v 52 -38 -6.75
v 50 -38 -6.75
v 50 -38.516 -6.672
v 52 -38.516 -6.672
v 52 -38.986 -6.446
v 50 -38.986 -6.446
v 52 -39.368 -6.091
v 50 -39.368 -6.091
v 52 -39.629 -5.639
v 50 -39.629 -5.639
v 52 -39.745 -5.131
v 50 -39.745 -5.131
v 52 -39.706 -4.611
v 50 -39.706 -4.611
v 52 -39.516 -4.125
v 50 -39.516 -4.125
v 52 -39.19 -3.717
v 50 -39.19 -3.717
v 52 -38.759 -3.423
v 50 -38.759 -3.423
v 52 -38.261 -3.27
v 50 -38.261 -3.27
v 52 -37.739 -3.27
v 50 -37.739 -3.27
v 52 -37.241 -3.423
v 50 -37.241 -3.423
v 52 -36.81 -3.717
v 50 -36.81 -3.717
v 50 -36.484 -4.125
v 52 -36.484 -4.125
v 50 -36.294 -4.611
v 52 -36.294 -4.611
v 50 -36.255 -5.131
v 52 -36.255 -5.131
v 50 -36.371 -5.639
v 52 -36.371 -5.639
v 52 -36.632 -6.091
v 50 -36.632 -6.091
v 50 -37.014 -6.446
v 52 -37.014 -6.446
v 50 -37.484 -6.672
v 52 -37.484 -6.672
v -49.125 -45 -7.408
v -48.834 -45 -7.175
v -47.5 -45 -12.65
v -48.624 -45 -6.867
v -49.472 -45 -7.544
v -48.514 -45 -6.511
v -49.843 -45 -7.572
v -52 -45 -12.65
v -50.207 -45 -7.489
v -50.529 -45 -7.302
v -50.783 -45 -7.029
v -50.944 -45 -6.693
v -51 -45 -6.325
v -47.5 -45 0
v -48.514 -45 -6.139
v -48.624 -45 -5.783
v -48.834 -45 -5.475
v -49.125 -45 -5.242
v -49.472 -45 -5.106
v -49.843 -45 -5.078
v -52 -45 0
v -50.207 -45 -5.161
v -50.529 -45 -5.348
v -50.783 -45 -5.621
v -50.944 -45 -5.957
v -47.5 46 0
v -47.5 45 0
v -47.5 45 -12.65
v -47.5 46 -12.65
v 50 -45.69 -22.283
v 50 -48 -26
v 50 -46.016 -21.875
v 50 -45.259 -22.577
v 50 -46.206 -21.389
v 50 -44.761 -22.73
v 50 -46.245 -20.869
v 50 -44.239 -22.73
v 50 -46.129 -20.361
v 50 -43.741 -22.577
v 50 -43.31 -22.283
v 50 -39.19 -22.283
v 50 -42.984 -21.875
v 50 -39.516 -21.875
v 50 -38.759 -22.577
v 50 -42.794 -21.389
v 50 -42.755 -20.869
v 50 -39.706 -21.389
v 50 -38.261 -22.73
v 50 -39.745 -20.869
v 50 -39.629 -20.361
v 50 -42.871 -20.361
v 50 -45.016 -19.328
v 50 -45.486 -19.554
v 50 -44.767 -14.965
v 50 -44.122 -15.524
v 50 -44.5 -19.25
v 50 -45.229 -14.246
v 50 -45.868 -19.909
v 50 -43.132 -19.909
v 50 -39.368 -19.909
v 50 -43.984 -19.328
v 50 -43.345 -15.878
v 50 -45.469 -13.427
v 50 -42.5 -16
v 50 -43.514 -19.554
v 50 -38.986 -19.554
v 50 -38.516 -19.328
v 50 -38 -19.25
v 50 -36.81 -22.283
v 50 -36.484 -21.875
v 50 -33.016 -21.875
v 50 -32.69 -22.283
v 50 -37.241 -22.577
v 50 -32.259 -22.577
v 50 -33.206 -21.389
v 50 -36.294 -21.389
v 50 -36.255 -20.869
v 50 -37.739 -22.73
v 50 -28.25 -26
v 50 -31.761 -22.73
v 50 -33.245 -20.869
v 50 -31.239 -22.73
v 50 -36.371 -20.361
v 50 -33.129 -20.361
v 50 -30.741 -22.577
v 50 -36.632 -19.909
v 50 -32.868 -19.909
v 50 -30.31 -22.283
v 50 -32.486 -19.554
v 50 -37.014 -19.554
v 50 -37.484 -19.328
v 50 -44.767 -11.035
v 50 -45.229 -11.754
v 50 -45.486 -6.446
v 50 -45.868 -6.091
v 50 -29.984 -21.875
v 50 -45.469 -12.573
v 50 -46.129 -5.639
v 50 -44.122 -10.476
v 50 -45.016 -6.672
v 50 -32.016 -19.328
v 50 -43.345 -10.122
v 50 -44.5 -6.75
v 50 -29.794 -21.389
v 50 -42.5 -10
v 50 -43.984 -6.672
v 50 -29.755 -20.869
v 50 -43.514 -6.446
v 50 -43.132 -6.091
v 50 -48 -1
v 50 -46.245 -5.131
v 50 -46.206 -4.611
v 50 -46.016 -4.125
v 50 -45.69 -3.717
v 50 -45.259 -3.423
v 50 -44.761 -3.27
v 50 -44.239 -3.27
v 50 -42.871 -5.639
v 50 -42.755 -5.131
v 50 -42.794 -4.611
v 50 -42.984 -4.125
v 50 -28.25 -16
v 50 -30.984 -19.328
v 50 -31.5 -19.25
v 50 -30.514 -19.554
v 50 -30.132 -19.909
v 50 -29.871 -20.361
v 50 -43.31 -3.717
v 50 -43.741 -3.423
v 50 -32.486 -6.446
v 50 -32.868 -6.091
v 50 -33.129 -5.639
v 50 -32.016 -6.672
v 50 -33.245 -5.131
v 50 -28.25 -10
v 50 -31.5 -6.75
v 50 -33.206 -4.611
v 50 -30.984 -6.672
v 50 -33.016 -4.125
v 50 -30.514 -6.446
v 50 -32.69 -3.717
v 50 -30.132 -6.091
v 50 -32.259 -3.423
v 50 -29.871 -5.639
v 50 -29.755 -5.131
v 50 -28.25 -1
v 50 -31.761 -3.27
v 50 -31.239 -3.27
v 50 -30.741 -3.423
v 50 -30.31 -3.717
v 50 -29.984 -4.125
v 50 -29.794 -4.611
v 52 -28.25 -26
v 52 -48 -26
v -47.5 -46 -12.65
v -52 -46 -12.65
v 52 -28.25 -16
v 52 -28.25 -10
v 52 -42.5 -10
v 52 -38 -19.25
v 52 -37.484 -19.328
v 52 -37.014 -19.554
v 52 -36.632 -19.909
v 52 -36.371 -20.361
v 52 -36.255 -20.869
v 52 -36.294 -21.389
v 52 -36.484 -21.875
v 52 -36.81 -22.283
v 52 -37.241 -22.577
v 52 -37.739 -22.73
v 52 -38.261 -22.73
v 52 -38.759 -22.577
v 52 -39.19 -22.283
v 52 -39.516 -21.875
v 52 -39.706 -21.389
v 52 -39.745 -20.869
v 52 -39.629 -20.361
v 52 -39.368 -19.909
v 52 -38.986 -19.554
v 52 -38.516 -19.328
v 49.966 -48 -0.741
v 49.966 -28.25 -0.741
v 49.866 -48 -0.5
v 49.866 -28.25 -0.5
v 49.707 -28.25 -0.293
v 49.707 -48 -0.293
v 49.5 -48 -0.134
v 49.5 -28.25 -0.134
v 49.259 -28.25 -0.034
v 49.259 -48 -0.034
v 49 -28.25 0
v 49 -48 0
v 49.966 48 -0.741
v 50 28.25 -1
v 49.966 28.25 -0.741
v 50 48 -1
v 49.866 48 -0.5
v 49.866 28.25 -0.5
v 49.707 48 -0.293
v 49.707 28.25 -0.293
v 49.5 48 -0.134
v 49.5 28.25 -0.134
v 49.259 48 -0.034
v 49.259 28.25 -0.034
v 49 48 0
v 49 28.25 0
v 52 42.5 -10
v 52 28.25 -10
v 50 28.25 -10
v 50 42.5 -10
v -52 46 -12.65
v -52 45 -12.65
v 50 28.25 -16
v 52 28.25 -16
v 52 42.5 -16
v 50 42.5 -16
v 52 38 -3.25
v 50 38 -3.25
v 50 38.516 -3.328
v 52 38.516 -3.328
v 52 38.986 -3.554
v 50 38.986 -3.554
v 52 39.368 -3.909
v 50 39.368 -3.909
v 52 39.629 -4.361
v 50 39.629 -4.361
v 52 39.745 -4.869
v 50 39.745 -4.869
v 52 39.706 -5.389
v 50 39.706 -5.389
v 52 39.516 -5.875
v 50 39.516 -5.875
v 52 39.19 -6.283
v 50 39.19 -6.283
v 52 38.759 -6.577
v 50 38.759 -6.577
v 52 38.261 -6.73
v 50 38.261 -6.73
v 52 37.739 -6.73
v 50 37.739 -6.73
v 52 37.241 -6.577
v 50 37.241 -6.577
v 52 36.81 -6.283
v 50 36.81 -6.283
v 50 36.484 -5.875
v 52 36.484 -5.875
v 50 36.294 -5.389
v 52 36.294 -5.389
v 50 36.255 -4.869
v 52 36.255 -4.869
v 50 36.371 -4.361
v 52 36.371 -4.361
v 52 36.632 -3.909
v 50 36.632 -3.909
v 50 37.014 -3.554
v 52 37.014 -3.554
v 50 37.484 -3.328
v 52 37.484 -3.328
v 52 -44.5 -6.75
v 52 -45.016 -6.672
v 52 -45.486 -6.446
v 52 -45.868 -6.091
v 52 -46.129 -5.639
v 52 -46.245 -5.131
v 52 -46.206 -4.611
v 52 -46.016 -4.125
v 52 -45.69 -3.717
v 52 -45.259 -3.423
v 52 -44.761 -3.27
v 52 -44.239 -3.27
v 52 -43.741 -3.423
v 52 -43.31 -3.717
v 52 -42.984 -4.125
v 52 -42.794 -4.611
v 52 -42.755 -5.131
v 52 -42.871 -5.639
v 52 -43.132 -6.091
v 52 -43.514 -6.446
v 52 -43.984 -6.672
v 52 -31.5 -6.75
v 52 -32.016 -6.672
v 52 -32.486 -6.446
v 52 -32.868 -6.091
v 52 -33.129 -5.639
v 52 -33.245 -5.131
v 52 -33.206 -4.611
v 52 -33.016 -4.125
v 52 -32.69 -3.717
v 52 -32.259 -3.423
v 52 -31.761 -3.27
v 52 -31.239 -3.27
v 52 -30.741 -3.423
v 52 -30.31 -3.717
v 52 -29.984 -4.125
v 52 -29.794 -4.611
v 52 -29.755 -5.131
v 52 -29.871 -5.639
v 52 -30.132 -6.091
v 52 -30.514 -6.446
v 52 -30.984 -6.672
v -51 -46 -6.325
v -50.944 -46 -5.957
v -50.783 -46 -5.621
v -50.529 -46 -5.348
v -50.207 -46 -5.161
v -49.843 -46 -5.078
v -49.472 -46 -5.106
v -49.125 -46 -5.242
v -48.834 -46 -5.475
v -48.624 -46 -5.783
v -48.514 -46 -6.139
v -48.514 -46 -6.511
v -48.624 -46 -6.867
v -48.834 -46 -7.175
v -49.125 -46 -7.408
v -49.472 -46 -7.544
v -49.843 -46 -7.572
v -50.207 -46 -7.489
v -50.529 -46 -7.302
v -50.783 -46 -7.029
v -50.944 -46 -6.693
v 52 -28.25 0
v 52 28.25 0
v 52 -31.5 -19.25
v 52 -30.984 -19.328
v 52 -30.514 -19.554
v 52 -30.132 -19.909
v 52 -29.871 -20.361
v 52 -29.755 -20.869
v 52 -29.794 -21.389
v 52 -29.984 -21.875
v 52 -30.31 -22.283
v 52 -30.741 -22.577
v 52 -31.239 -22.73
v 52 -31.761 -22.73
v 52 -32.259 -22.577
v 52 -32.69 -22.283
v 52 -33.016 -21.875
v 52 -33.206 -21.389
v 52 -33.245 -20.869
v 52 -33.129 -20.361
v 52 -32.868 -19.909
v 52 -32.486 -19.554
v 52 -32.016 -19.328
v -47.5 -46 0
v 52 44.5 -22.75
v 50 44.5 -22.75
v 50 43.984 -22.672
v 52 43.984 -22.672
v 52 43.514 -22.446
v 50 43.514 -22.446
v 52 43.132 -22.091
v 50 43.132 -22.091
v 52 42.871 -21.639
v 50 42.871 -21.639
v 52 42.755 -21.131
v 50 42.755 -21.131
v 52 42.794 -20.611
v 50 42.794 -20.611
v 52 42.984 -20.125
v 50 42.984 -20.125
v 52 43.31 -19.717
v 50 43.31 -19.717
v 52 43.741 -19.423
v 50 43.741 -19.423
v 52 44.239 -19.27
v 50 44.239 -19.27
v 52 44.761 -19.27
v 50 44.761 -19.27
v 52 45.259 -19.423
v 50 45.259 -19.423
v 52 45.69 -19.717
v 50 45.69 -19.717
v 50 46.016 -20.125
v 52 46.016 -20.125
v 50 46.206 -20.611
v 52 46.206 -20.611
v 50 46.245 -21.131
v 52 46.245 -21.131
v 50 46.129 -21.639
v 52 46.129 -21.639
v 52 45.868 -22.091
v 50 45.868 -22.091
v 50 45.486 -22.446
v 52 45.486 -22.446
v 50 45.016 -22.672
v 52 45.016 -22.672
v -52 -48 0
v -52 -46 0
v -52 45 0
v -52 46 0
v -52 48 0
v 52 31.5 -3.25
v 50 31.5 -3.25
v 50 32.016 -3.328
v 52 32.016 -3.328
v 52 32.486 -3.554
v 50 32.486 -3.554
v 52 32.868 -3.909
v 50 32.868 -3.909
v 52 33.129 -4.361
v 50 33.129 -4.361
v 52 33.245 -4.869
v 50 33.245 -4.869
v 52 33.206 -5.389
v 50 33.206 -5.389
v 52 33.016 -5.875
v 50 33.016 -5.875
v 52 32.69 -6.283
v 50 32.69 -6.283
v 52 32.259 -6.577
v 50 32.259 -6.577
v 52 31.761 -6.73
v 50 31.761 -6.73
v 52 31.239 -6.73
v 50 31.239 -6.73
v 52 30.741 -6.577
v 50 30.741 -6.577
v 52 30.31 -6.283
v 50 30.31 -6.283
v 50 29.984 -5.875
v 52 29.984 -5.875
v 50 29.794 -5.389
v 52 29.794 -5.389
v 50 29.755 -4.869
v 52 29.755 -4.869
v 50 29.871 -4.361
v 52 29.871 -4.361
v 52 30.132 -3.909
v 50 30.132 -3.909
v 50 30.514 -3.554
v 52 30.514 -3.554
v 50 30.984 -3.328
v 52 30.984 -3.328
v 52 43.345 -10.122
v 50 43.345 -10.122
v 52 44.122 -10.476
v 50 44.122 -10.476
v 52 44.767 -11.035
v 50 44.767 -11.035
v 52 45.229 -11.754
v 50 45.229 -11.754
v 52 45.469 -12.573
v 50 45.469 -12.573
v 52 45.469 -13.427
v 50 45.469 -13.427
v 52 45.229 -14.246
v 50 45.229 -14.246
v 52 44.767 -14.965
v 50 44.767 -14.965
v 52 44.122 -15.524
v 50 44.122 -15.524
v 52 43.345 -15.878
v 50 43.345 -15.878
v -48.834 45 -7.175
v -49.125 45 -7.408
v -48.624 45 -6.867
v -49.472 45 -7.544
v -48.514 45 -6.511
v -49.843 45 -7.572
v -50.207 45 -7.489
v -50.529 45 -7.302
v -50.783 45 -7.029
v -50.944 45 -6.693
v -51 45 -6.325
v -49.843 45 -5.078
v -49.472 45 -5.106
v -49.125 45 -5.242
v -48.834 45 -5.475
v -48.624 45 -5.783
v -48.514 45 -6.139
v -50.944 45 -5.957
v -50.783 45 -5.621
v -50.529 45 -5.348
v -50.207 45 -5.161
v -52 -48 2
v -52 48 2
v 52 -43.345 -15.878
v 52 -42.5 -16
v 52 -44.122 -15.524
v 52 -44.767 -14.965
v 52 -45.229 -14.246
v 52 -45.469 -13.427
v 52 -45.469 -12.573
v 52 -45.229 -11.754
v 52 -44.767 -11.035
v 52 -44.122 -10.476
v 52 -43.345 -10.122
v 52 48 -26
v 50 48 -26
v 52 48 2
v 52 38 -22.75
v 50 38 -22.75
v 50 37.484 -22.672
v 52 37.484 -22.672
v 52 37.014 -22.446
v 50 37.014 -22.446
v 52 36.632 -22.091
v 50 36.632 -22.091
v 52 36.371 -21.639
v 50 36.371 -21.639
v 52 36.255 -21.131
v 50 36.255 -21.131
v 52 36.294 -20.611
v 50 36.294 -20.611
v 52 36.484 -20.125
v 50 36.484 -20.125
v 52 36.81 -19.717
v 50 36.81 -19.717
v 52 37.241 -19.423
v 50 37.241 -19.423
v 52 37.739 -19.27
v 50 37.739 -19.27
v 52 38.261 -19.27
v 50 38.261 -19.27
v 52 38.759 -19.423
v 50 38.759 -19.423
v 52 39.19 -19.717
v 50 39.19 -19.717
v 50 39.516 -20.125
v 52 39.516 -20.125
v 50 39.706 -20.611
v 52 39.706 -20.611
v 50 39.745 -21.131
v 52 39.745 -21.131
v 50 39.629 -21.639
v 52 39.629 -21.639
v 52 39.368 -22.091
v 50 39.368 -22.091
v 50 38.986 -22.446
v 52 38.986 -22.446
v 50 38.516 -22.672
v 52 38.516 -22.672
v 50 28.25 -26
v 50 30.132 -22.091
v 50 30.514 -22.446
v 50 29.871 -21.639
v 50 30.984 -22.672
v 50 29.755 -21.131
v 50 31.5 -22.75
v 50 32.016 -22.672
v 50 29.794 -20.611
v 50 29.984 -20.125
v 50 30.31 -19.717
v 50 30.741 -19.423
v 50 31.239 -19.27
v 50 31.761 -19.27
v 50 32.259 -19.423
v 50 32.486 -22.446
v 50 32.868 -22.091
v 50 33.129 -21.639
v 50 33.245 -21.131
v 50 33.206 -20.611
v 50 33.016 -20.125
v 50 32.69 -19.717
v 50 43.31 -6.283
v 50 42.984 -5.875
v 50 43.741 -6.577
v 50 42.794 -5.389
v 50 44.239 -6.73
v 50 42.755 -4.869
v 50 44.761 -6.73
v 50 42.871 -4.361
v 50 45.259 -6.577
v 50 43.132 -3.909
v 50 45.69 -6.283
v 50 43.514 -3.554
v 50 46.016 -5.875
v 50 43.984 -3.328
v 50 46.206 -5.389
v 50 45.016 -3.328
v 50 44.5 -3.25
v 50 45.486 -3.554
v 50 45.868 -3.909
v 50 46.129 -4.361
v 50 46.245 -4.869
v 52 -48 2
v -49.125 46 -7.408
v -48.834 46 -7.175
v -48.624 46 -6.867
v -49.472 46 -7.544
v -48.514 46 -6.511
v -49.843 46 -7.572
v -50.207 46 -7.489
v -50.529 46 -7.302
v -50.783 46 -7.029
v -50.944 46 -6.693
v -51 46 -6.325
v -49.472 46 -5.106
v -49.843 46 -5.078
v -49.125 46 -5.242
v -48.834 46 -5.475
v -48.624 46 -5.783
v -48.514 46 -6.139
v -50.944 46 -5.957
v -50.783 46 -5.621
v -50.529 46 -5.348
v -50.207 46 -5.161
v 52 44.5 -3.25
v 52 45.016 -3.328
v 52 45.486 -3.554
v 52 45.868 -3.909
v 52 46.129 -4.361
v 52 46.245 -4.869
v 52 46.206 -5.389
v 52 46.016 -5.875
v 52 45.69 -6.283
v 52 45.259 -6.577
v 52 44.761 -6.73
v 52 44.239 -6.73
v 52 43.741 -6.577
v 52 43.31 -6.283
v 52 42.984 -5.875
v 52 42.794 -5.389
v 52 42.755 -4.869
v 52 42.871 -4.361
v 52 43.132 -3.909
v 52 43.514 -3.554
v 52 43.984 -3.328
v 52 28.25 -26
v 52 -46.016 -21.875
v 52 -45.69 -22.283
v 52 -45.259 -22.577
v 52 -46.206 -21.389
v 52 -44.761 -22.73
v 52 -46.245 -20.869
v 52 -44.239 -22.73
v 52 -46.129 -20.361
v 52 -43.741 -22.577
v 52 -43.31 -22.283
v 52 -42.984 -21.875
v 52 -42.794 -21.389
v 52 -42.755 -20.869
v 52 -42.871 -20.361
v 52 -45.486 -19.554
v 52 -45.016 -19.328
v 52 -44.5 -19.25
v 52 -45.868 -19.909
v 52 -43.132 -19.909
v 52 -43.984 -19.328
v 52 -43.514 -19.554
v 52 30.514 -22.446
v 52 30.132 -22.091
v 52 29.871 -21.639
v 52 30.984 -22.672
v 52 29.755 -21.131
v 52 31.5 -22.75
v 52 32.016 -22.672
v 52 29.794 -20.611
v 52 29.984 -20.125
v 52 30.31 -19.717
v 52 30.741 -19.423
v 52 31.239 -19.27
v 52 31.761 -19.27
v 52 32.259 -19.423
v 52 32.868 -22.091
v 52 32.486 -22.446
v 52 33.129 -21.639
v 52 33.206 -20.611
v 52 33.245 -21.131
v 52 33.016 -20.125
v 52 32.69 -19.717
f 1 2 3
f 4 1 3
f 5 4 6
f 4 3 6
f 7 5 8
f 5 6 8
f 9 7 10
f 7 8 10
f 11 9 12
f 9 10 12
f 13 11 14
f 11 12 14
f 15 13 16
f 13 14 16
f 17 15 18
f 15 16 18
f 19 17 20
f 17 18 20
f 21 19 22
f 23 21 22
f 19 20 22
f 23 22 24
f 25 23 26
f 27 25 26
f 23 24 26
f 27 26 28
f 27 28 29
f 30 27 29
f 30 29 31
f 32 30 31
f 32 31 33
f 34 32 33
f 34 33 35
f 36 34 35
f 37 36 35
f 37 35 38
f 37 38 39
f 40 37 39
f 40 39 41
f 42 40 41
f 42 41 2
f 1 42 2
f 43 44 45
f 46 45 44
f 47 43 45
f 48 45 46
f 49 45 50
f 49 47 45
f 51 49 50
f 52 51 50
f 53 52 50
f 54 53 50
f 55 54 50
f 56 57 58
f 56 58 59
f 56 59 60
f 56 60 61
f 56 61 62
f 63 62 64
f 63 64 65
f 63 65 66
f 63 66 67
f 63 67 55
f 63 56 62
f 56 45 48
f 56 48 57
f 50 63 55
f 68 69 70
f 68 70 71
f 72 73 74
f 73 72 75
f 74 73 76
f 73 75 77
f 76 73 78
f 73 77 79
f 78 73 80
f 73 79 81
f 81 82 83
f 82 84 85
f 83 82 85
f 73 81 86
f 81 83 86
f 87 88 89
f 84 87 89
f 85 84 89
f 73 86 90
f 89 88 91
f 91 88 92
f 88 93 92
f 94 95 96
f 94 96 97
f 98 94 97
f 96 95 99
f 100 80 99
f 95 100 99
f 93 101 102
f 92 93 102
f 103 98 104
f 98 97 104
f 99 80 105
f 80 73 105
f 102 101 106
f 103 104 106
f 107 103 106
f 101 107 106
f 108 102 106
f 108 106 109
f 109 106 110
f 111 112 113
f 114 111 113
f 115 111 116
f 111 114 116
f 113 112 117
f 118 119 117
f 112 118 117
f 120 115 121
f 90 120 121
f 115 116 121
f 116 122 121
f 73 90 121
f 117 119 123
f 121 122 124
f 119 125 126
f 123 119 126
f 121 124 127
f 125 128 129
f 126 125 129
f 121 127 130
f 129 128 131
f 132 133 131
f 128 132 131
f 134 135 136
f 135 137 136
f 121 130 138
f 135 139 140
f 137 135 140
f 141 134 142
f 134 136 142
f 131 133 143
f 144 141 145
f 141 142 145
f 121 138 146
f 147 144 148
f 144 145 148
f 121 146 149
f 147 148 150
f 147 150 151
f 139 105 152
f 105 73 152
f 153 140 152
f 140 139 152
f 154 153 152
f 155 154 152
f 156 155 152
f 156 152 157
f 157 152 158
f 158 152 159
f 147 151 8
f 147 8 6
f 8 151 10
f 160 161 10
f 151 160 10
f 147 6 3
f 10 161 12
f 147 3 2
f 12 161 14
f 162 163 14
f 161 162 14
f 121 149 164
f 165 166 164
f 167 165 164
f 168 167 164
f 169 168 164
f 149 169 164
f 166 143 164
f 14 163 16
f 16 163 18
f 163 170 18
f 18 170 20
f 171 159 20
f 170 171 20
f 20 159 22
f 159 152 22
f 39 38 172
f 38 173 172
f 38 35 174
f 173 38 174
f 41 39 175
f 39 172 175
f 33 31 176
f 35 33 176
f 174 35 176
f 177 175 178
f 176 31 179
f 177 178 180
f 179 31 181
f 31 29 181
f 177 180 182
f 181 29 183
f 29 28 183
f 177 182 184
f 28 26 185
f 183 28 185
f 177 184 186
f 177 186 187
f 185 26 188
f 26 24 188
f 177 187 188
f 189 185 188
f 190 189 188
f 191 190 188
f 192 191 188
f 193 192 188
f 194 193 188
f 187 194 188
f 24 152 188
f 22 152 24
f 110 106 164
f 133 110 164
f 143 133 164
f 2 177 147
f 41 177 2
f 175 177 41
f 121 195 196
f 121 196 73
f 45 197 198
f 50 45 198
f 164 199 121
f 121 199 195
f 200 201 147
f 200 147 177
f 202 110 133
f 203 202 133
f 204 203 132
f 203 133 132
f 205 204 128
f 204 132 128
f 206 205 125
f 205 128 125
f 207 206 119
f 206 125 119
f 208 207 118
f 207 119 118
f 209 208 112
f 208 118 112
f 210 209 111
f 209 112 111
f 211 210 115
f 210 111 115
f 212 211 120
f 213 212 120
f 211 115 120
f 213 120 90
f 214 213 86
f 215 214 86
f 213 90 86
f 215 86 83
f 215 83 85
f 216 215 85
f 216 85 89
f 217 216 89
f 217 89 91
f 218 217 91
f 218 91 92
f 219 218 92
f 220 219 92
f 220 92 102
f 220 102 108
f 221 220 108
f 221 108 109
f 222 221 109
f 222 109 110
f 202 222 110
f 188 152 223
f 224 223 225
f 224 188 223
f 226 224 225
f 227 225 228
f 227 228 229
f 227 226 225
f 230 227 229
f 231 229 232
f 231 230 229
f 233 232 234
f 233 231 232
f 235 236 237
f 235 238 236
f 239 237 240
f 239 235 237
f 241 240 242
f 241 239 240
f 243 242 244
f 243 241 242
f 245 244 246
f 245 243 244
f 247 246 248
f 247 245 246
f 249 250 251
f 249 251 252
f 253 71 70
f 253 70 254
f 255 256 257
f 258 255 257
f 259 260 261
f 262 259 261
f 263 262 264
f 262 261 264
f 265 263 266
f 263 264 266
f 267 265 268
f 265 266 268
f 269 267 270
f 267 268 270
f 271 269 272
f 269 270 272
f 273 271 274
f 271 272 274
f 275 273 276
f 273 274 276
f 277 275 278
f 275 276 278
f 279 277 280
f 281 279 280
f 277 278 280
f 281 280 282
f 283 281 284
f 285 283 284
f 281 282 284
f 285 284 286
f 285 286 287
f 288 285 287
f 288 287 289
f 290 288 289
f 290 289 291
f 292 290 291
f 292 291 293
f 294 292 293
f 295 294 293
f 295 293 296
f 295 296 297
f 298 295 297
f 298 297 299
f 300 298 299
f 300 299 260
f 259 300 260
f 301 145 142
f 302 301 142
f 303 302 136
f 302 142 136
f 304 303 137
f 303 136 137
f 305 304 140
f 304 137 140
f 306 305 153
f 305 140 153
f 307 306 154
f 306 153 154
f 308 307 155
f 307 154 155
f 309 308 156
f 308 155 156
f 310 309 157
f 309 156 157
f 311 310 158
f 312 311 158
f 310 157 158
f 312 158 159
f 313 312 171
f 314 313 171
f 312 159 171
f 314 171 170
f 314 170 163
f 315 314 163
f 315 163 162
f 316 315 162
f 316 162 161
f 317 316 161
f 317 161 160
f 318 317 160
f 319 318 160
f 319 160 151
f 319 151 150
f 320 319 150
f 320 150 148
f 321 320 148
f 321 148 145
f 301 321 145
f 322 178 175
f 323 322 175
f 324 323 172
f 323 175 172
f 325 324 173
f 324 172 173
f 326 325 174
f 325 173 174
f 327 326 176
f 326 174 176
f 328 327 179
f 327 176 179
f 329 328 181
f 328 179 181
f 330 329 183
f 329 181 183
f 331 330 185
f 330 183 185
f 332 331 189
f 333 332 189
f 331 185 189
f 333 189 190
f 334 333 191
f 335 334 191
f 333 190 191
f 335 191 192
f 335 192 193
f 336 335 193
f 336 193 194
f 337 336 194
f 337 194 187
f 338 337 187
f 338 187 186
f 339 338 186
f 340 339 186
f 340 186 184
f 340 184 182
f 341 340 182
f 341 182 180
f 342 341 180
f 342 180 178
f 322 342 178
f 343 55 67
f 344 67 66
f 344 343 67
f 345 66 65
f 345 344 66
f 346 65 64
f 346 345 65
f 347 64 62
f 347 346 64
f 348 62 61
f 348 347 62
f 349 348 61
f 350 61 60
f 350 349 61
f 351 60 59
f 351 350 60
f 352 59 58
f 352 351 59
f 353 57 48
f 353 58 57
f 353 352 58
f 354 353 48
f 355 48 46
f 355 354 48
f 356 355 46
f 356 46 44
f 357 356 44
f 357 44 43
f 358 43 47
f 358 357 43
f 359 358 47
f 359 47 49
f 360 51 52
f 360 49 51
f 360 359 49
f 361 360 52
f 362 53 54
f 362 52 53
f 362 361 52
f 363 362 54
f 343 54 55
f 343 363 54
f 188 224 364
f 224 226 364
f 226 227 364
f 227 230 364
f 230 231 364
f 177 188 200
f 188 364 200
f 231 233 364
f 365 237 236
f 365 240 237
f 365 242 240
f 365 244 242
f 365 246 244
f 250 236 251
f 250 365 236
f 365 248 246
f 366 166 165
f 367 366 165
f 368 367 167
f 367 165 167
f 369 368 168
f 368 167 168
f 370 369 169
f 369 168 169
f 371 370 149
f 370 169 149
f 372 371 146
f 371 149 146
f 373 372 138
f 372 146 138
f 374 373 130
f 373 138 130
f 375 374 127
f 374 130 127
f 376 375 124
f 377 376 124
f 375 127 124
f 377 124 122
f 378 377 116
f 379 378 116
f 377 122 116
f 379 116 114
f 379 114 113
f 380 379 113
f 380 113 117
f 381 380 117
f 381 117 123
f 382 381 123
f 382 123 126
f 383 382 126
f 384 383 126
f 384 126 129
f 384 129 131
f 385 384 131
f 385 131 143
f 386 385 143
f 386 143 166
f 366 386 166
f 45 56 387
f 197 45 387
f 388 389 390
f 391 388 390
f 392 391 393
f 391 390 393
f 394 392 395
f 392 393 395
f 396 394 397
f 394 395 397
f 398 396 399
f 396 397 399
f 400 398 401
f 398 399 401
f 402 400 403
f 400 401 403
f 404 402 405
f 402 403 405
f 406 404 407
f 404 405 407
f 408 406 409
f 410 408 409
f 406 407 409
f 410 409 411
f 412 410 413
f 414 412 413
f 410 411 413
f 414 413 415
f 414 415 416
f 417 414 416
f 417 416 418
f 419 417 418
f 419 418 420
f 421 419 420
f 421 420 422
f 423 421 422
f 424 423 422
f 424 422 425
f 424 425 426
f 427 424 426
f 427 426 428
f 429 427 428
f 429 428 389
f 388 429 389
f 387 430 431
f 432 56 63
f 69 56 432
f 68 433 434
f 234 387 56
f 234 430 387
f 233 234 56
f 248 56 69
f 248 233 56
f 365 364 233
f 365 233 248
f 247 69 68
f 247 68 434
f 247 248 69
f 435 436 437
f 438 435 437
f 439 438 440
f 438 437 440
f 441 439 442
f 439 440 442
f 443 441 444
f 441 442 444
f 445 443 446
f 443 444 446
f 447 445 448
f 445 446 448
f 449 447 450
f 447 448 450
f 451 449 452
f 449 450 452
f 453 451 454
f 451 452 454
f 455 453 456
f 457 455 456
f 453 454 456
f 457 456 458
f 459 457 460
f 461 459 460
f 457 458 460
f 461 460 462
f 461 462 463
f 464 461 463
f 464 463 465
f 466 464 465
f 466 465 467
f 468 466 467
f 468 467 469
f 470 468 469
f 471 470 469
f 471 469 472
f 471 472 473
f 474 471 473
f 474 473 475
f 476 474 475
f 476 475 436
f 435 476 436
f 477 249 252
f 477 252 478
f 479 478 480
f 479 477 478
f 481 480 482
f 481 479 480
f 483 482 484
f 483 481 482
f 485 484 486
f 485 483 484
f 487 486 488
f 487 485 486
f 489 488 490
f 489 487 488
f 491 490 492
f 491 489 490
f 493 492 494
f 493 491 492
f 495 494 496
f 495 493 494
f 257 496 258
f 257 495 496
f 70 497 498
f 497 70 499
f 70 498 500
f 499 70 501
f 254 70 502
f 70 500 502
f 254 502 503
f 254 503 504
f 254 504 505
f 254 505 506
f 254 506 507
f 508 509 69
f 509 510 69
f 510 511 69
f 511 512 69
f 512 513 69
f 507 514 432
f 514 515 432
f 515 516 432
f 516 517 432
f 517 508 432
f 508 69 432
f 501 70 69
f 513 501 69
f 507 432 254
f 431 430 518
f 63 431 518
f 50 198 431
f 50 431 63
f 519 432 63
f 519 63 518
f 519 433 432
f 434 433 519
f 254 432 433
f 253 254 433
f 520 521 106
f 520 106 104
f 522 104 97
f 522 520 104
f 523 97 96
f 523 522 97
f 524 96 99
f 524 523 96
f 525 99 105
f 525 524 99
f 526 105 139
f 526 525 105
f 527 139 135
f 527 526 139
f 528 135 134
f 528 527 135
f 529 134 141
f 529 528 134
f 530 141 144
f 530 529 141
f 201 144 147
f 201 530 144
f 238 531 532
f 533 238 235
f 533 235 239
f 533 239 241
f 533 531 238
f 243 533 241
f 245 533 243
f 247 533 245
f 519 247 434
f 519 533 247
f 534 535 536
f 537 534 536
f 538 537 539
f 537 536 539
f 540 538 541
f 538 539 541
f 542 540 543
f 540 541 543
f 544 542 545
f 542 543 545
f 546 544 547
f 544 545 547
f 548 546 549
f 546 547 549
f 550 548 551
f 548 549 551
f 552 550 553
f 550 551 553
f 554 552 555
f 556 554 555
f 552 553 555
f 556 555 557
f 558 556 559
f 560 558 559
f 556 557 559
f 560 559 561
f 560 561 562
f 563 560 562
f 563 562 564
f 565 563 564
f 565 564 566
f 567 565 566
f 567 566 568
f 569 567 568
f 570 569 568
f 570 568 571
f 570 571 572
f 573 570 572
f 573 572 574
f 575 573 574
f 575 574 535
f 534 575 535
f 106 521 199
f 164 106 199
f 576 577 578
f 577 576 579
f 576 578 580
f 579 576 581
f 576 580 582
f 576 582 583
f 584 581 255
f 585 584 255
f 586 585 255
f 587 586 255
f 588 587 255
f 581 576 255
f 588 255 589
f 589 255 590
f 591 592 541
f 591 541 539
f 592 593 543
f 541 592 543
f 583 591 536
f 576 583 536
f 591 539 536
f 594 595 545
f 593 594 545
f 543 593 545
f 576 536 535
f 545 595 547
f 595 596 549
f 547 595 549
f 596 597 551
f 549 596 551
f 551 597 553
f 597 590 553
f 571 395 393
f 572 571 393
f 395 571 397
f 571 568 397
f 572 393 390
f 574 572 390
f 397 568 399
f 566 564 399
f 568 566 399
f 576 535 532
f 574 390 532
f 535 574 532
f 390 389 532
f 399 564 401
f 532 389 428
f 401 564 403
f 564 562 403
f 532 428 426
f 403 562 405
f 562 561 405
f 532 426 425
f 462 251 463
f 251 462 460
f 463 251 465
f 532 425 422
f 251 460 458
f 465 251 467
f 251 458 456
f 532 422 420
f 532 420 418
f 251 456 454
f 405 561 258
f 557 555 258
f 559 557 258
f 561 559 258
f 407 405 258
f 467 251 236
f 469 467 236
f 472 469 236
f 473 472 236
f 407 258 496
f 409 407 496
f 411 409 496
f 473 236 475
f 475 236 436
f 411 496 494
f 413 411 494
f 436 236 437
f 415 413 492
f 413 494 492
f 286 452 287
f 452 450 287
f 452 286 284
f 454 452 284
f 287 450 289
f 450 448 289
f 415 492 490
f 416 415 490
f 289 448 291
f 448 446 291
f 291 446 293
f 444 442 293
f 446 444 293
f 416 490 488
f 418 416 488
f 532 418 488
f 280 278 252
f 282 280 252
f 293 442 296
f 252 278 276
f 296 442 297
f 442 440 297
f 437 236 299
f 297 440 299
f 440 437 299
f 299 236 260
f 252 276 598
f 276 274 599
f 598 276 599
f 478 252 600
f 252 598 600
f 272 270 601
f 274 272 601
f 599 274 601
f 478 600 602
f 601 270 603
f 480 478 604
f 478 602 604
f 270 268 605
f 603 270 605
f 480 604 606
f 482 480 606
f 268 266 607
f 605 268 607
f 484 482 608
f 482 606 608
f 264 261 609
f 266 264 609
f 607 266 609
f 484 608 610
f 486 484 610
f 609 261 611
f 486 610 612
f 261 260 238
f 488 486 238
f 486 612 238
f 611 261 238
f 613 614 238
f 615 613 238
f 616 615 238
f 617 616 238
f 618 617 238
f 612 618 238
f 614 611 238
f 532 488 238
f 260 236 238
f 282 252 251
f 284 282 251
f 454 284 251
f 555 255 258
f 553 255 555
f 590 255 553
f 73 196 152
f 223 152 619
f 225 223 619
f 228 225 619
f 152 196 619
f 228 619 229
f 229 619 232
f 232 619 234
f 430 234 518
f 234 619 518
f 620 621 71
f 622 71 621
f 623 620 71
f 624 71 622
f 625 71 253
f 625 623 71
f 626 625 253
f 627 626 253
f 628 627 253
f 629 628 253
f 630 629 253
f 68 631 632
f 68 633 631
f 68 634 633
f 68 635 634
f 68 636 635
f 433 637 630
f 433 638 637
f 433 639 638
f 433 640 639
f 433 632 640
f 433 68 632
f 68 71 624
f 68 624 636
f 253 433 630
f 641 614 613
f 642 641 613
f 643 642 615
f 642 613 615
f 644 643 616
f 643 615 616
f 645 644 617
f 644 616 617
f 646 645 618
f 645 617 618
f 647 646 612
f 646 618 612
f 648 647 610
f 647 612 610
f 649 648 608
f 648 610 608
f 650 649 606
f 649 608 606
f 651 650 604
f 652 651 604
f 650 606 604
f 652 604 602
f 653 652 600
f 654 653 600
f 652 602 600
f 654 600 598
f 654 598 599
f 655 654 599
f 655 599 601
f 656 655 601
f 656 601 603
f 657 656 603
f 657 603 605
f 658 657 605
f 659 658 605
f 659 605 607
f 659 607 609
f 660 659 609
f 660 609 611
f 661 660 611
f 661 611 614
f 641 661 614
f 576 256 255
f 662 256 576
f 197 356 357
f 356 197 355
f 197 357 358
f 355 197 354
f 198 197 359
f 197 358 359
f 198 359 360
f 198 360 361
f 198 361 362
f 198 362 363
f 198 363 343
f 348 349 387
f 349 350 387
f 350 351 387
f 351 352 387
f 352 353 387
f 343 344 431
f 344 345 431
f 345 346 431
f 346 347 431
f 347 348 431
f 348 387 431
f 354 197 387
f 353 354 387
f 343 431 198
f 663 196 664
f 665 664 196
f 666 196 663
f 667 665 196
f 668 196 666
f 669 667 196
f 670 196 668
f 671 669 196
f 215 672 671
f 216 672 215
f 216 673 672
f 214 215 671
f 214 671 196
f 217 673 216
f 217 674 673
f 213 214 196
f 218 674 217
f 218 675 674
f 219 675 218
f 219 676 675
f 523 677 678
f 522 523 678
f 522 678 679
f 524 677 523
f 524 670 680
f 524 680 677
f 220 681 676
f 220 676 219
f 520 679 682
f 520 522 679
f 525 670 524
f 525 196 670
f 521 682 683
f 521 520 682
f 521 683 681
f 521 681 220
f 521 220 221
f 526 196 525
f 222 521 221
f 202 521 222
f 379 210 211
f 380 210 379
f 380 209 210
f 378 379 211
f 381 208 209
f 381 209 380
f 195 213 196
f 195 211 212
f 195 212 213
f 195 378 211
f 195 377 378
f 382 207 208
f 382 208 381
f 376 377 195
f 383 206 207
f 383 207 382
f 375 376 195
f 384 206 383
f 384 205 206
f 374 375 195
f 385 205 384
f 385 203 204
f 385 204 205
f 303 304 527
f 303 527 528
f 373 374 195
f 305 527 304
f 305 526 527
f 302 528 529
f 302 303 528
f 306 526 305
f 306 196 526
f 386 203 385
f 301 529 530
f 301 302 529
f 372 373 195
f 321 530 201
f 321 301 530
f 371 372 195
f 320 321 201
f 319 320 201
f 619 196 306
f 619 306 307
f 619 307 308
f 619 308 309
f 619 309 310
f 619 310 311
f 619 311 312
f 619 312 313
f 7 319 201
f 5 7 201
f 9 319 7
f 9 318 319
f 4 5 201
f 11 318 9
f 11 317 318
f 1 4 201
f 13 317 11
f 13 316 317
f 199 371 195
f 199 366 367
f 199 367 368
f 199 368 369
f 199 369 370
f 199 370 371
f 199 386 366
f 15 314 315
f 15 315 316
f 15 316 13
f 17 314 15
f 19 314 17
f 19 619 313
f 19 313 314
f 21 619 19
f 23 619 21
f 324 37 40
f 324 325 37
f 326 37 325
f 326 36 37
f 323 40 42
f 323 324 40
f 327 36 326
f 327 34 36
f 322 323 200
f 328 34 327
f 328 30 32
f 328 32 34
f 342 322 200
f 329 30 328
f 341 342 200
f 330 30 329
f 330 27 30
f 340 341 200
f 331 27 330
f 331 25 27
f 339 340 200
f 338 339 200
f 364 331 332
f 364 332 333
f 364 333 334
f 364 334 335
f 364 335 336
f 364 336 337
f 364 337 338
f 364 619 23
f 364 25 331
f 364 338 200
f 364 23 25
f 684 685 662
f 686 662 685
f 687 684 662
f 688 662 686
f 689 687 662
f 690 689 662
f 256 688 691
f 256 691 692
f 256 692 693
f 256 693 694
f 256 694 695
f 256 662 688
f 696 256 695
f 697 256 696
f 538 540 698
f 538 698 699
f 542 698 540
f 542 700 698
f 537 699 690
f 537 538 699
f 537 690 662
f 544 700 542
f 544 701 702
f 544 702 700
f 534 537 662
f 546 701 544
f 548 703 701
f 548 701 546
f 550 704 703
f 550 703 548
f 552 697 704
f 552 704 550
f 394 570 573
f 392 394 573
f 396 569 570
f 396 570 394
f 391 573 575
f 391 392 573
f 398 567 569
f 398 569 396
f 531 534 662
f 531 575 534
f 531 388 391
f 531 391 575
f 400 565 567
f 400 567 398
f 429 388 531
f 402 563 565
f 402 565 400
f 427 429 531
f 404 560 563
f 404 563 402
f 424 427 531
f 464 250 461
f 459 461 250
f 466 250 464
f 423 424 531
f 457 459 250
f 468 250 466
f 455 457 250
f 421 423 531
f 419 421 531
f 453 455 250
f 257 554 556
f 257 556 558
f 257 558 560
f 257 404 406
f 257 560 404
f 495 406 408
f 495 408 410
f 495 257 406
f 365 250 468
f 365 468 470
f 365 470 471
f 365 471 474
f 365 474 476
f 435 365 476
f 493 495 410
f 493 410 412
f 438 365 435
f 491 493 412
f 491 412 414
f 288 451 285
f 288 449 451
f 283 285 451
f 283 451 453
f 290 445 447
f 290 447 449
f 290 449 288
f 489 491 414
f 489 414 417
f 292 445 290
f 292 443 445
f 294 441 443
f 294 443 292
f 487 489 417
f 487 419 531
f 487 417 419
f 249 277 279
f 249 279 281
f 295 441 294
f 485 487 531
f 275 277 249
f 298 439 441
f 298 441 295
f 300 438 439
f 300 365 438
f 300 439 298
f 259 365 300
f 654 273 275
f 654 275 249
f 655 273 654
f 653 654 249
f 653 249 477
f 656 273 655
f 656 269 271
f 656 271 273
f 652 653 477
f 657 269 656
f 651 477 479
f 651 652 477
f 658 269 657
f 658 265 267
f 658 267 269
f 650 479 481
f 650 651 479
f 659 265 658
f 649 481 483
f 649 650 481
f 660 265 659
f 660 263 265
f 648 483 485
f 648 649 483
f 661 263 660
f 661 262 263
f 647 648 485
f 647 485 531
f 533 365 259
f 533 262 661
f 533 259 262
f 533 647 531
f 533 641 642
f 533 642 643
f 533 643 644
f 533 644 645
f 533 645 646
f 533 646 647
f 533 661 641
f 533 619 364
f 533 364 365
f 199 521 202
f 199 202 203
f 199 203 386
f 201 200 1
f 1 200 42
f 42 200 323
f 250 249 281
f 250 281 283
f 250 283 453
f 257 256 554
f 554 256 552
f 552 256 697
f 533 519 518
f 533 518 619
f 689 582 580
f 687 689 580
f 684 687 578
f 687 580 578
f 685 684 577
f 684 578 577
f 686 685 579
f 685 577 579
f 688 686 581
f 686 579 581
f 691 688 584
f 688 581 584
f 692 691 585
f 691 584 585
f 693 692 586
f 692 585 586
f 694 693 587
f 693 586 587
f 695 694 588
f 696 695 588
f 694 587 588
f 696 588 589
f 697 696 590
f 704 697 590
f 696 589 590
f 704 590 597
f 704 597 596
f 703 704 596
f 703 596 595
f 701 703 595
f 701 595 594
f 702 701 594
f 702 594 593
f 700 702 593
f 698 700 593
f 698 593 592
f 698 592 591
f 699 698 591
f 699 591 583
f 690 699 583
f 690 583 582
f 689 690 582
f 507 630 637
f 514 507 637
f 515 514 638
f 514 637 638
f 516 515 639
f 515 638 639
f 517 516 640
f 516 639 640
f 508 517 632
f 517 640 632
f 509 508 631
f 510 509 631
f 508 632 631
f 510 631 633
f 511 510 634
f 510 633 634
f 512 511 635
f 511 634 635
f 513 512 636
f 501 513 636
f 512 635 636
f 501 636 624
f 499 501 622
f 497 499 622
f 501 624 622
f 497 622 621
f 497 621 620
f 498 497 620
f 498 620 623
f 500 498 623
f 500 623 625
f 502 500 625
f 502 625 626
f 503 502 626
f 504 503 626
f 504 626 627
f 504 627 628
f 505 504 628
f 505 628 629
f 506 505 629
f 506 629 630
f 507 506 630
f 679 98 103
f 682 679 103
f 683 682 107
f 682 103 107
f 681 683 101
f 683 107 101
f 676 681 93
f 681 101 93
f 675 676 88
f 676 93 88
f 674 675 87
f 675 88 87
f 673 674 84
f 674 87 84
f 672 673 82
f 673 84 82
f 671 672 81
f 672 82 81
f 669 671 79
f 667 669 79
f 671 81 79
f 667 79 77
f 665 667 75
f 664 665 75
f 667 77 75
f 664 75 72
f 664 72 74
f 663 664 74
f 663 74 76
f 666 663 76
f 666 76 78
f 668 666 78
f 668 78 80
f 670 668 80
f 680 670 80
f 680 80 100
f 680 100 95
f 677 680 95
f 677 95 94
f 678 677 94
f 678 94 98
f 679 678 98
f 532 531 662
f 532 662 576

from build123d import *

# Parameters (mm, degrees)
SKETCH_1_W          = 104
SKETCH_1_H          = 96
EXTRUDE_1_DEPTH     = 2
SKETCH_2_W          = 2
SKETCH_2_H          = 96
EXTRUDE_2_DEPTH     = 26
SKETCH_3_R          = 1.75
CUT_EXTRUDE_1_DEPTH = 116.689238912
SKETCH_4_W          = 26
SKETCH_4_H          = 56.5
CUT_EXTRUDE_2_DEPTH = 118.45637488
FILLET_2_R          = 1
SKETCH_5_W          = 6
SKETCH_5_H          = 14.25
CUT_EXTRUDE_3_DEPTH = 118.45637488
SKETCH_6_W          = 4.5
SKETCH_6_H          = 1
EXTRUDE_3_DEPTH     = 12.65
SKETCH_7_R          = 1.25
CUT_EXTRUDE_4_DEPTH = 111.526015037


with BuildPart() as part:
    # 草图1 → 凸台-拉伸1 (new body)
    with BuildSketch(Plane.XY):
        Rectangle(SKETCH_1_W, SKETCH_1_H)
    extrude(amount=EXTRUDE_1_DEPTH)

    # 草图2 → 凸台-拉伸2 (add)
    with BuildSketch(Plane(origin=(0, 0, 0), x_dir=(-1, 0, 0), z_dir=(0, 0, -1))):
        with Locations((-51, 0)):
            Rectangle(SKETCH_2_W, SKETCH_2_H)
    extrude(amount=EXTRUDE_2_DEPTH)

    # 草图3 → 切除-拉伸1 (cut, through all)
    with BuildSketch(Plane.ZY.offset(-50)):
        with Locations((-5, 44.5)):
            Circle(SKETCH_3_R)
        with Locations((-5, 38)):
            Circle(SKETCH_3_R)
        with Locations((-5, 31.5)):
            Circle(SKETCH_3_R)
        with Locations(Location((-21, 31.5, 0), (0, 0, 180))):
            Circle(SKETCH_3_R)
        with Locations(Location((-21, 38, 0), (0, 0, 180))):
            Circle(SKETCH_3_R)
        with Locations(Location((-21, 44.5, 0), (0, 0, 180))):
            Circle(SKETCH_3_R)
        with Locations((-21, -44.5)):
            Circle(SKETCH_3_R)
        with Locations((-21, -38)):
            Circle(SKETCH_3_R)
        with Locations((-21, -31.5)):
            Circle(SKETCH_3_R)
        with Locations(Location((-5, -31.5, 0), (0, 0, 180))):
            Circle(SKETCH_3_R)
        with Locations(Location((-5, -38, 0), (0, 0, 180))):
            Circle(SKETCH_3_R)
        with Locations(Location((-5, -44.5, 0), (0, 0, 180))):
            Circle(SKETCH_3_R)
    extrude(amount=-CUT_EXTRUDE_1_DEPTH, mode=Mode.SUBTRACT)

    # 草图4 → 切除-拉伸2 (cut, through all)
    with BuildSketch(Plane(origin=(52, 0, 0), x_dir=(0, 0, -1), z_dir=(1, 0, 0))):
        with Locations((13, 0)):
            Rectangle(SKETCH_4_W, SKETCH_4_H)
    extrude(amount=-CUT_EXTRUDE_2_DEPTH, mode=Mode.SUBTRACT)

    # 圆角2
    fillet_2_edges = [part.edges().sort_by_distance(p)[0] for p in [
        (50, -38.125, 0),
        (50, 38.125, 0),
    ]]
    fillet(fillet_2_edges, radius=FILLET_2_R)

    # 草图5 → 切除-拉伸3 (cut, through all)
    with BuildSketch(Plane(origin=(52, 0, 0), x_dir=(0, 0, -1), z_dir=(1, 0, 0))):
        with Locations((13, 35.375)):
            Rectangle(SKETCH_5_W, SKETCH_5_H)
        with BuildLine():
            ThreePointArc((10, 42.5), (13, 45.5), (16, 42.5))
            Line((16, 42.5), (10, 42.5))
        make_face()
        with Locations((13, -35.375)):
            Rectangle(SKETCH_5_W, SKETCH_5_H)
        with BuildLine():
            Line((10, -42.5), (16, -42.5))
            ThreePointArc((16, -42.5), (13, -45.5), (10, -42.5))
        make_face()
    extrude(amount=-CUT_EXTRUDE_3_DEPTH, mode=Mode.SUBTRACT)

    # 草图6 → 凸台-拉伸3 (add)
    with BuildSketch(Plane(origin=(0, 0, 0), x_dir=(-1, 0, 0), z_dir=(0, 0, -1))):
        with Locations((49.75, 45.5)):
            Rectangle(SKETCH_6_W, SKETCH_6_H)
    extrude_3 = extrude(amount=EXTRUDE_3_DEPTH)

    # 草图7 → 切除-拉伸4 (cut, through all)
    with BuildSketch(Plane(origin=(0, 46, 0), x_dir=(1, 0, 0), z_dir=(0, 1, 0))):
        with Locations(Location((-49.75, 6.325, 0), (0, 0, 180))):
            Circle(SKETCH_7_R)
    cut_extrude_4 = extrude(amount=-CUT_EXTRUDE_4_DEPTH, mode=Mode.SUBTRACT)

    # 镜向1: 凸台-拉伸3, 切除-拉伸4 across plane
    add(extrude_3.mirror(Plane.ZX))
    add(cut_extrude_4.mirror(Plane.ZX), mode=Mode.SUBTRACT)


solid = part.part
